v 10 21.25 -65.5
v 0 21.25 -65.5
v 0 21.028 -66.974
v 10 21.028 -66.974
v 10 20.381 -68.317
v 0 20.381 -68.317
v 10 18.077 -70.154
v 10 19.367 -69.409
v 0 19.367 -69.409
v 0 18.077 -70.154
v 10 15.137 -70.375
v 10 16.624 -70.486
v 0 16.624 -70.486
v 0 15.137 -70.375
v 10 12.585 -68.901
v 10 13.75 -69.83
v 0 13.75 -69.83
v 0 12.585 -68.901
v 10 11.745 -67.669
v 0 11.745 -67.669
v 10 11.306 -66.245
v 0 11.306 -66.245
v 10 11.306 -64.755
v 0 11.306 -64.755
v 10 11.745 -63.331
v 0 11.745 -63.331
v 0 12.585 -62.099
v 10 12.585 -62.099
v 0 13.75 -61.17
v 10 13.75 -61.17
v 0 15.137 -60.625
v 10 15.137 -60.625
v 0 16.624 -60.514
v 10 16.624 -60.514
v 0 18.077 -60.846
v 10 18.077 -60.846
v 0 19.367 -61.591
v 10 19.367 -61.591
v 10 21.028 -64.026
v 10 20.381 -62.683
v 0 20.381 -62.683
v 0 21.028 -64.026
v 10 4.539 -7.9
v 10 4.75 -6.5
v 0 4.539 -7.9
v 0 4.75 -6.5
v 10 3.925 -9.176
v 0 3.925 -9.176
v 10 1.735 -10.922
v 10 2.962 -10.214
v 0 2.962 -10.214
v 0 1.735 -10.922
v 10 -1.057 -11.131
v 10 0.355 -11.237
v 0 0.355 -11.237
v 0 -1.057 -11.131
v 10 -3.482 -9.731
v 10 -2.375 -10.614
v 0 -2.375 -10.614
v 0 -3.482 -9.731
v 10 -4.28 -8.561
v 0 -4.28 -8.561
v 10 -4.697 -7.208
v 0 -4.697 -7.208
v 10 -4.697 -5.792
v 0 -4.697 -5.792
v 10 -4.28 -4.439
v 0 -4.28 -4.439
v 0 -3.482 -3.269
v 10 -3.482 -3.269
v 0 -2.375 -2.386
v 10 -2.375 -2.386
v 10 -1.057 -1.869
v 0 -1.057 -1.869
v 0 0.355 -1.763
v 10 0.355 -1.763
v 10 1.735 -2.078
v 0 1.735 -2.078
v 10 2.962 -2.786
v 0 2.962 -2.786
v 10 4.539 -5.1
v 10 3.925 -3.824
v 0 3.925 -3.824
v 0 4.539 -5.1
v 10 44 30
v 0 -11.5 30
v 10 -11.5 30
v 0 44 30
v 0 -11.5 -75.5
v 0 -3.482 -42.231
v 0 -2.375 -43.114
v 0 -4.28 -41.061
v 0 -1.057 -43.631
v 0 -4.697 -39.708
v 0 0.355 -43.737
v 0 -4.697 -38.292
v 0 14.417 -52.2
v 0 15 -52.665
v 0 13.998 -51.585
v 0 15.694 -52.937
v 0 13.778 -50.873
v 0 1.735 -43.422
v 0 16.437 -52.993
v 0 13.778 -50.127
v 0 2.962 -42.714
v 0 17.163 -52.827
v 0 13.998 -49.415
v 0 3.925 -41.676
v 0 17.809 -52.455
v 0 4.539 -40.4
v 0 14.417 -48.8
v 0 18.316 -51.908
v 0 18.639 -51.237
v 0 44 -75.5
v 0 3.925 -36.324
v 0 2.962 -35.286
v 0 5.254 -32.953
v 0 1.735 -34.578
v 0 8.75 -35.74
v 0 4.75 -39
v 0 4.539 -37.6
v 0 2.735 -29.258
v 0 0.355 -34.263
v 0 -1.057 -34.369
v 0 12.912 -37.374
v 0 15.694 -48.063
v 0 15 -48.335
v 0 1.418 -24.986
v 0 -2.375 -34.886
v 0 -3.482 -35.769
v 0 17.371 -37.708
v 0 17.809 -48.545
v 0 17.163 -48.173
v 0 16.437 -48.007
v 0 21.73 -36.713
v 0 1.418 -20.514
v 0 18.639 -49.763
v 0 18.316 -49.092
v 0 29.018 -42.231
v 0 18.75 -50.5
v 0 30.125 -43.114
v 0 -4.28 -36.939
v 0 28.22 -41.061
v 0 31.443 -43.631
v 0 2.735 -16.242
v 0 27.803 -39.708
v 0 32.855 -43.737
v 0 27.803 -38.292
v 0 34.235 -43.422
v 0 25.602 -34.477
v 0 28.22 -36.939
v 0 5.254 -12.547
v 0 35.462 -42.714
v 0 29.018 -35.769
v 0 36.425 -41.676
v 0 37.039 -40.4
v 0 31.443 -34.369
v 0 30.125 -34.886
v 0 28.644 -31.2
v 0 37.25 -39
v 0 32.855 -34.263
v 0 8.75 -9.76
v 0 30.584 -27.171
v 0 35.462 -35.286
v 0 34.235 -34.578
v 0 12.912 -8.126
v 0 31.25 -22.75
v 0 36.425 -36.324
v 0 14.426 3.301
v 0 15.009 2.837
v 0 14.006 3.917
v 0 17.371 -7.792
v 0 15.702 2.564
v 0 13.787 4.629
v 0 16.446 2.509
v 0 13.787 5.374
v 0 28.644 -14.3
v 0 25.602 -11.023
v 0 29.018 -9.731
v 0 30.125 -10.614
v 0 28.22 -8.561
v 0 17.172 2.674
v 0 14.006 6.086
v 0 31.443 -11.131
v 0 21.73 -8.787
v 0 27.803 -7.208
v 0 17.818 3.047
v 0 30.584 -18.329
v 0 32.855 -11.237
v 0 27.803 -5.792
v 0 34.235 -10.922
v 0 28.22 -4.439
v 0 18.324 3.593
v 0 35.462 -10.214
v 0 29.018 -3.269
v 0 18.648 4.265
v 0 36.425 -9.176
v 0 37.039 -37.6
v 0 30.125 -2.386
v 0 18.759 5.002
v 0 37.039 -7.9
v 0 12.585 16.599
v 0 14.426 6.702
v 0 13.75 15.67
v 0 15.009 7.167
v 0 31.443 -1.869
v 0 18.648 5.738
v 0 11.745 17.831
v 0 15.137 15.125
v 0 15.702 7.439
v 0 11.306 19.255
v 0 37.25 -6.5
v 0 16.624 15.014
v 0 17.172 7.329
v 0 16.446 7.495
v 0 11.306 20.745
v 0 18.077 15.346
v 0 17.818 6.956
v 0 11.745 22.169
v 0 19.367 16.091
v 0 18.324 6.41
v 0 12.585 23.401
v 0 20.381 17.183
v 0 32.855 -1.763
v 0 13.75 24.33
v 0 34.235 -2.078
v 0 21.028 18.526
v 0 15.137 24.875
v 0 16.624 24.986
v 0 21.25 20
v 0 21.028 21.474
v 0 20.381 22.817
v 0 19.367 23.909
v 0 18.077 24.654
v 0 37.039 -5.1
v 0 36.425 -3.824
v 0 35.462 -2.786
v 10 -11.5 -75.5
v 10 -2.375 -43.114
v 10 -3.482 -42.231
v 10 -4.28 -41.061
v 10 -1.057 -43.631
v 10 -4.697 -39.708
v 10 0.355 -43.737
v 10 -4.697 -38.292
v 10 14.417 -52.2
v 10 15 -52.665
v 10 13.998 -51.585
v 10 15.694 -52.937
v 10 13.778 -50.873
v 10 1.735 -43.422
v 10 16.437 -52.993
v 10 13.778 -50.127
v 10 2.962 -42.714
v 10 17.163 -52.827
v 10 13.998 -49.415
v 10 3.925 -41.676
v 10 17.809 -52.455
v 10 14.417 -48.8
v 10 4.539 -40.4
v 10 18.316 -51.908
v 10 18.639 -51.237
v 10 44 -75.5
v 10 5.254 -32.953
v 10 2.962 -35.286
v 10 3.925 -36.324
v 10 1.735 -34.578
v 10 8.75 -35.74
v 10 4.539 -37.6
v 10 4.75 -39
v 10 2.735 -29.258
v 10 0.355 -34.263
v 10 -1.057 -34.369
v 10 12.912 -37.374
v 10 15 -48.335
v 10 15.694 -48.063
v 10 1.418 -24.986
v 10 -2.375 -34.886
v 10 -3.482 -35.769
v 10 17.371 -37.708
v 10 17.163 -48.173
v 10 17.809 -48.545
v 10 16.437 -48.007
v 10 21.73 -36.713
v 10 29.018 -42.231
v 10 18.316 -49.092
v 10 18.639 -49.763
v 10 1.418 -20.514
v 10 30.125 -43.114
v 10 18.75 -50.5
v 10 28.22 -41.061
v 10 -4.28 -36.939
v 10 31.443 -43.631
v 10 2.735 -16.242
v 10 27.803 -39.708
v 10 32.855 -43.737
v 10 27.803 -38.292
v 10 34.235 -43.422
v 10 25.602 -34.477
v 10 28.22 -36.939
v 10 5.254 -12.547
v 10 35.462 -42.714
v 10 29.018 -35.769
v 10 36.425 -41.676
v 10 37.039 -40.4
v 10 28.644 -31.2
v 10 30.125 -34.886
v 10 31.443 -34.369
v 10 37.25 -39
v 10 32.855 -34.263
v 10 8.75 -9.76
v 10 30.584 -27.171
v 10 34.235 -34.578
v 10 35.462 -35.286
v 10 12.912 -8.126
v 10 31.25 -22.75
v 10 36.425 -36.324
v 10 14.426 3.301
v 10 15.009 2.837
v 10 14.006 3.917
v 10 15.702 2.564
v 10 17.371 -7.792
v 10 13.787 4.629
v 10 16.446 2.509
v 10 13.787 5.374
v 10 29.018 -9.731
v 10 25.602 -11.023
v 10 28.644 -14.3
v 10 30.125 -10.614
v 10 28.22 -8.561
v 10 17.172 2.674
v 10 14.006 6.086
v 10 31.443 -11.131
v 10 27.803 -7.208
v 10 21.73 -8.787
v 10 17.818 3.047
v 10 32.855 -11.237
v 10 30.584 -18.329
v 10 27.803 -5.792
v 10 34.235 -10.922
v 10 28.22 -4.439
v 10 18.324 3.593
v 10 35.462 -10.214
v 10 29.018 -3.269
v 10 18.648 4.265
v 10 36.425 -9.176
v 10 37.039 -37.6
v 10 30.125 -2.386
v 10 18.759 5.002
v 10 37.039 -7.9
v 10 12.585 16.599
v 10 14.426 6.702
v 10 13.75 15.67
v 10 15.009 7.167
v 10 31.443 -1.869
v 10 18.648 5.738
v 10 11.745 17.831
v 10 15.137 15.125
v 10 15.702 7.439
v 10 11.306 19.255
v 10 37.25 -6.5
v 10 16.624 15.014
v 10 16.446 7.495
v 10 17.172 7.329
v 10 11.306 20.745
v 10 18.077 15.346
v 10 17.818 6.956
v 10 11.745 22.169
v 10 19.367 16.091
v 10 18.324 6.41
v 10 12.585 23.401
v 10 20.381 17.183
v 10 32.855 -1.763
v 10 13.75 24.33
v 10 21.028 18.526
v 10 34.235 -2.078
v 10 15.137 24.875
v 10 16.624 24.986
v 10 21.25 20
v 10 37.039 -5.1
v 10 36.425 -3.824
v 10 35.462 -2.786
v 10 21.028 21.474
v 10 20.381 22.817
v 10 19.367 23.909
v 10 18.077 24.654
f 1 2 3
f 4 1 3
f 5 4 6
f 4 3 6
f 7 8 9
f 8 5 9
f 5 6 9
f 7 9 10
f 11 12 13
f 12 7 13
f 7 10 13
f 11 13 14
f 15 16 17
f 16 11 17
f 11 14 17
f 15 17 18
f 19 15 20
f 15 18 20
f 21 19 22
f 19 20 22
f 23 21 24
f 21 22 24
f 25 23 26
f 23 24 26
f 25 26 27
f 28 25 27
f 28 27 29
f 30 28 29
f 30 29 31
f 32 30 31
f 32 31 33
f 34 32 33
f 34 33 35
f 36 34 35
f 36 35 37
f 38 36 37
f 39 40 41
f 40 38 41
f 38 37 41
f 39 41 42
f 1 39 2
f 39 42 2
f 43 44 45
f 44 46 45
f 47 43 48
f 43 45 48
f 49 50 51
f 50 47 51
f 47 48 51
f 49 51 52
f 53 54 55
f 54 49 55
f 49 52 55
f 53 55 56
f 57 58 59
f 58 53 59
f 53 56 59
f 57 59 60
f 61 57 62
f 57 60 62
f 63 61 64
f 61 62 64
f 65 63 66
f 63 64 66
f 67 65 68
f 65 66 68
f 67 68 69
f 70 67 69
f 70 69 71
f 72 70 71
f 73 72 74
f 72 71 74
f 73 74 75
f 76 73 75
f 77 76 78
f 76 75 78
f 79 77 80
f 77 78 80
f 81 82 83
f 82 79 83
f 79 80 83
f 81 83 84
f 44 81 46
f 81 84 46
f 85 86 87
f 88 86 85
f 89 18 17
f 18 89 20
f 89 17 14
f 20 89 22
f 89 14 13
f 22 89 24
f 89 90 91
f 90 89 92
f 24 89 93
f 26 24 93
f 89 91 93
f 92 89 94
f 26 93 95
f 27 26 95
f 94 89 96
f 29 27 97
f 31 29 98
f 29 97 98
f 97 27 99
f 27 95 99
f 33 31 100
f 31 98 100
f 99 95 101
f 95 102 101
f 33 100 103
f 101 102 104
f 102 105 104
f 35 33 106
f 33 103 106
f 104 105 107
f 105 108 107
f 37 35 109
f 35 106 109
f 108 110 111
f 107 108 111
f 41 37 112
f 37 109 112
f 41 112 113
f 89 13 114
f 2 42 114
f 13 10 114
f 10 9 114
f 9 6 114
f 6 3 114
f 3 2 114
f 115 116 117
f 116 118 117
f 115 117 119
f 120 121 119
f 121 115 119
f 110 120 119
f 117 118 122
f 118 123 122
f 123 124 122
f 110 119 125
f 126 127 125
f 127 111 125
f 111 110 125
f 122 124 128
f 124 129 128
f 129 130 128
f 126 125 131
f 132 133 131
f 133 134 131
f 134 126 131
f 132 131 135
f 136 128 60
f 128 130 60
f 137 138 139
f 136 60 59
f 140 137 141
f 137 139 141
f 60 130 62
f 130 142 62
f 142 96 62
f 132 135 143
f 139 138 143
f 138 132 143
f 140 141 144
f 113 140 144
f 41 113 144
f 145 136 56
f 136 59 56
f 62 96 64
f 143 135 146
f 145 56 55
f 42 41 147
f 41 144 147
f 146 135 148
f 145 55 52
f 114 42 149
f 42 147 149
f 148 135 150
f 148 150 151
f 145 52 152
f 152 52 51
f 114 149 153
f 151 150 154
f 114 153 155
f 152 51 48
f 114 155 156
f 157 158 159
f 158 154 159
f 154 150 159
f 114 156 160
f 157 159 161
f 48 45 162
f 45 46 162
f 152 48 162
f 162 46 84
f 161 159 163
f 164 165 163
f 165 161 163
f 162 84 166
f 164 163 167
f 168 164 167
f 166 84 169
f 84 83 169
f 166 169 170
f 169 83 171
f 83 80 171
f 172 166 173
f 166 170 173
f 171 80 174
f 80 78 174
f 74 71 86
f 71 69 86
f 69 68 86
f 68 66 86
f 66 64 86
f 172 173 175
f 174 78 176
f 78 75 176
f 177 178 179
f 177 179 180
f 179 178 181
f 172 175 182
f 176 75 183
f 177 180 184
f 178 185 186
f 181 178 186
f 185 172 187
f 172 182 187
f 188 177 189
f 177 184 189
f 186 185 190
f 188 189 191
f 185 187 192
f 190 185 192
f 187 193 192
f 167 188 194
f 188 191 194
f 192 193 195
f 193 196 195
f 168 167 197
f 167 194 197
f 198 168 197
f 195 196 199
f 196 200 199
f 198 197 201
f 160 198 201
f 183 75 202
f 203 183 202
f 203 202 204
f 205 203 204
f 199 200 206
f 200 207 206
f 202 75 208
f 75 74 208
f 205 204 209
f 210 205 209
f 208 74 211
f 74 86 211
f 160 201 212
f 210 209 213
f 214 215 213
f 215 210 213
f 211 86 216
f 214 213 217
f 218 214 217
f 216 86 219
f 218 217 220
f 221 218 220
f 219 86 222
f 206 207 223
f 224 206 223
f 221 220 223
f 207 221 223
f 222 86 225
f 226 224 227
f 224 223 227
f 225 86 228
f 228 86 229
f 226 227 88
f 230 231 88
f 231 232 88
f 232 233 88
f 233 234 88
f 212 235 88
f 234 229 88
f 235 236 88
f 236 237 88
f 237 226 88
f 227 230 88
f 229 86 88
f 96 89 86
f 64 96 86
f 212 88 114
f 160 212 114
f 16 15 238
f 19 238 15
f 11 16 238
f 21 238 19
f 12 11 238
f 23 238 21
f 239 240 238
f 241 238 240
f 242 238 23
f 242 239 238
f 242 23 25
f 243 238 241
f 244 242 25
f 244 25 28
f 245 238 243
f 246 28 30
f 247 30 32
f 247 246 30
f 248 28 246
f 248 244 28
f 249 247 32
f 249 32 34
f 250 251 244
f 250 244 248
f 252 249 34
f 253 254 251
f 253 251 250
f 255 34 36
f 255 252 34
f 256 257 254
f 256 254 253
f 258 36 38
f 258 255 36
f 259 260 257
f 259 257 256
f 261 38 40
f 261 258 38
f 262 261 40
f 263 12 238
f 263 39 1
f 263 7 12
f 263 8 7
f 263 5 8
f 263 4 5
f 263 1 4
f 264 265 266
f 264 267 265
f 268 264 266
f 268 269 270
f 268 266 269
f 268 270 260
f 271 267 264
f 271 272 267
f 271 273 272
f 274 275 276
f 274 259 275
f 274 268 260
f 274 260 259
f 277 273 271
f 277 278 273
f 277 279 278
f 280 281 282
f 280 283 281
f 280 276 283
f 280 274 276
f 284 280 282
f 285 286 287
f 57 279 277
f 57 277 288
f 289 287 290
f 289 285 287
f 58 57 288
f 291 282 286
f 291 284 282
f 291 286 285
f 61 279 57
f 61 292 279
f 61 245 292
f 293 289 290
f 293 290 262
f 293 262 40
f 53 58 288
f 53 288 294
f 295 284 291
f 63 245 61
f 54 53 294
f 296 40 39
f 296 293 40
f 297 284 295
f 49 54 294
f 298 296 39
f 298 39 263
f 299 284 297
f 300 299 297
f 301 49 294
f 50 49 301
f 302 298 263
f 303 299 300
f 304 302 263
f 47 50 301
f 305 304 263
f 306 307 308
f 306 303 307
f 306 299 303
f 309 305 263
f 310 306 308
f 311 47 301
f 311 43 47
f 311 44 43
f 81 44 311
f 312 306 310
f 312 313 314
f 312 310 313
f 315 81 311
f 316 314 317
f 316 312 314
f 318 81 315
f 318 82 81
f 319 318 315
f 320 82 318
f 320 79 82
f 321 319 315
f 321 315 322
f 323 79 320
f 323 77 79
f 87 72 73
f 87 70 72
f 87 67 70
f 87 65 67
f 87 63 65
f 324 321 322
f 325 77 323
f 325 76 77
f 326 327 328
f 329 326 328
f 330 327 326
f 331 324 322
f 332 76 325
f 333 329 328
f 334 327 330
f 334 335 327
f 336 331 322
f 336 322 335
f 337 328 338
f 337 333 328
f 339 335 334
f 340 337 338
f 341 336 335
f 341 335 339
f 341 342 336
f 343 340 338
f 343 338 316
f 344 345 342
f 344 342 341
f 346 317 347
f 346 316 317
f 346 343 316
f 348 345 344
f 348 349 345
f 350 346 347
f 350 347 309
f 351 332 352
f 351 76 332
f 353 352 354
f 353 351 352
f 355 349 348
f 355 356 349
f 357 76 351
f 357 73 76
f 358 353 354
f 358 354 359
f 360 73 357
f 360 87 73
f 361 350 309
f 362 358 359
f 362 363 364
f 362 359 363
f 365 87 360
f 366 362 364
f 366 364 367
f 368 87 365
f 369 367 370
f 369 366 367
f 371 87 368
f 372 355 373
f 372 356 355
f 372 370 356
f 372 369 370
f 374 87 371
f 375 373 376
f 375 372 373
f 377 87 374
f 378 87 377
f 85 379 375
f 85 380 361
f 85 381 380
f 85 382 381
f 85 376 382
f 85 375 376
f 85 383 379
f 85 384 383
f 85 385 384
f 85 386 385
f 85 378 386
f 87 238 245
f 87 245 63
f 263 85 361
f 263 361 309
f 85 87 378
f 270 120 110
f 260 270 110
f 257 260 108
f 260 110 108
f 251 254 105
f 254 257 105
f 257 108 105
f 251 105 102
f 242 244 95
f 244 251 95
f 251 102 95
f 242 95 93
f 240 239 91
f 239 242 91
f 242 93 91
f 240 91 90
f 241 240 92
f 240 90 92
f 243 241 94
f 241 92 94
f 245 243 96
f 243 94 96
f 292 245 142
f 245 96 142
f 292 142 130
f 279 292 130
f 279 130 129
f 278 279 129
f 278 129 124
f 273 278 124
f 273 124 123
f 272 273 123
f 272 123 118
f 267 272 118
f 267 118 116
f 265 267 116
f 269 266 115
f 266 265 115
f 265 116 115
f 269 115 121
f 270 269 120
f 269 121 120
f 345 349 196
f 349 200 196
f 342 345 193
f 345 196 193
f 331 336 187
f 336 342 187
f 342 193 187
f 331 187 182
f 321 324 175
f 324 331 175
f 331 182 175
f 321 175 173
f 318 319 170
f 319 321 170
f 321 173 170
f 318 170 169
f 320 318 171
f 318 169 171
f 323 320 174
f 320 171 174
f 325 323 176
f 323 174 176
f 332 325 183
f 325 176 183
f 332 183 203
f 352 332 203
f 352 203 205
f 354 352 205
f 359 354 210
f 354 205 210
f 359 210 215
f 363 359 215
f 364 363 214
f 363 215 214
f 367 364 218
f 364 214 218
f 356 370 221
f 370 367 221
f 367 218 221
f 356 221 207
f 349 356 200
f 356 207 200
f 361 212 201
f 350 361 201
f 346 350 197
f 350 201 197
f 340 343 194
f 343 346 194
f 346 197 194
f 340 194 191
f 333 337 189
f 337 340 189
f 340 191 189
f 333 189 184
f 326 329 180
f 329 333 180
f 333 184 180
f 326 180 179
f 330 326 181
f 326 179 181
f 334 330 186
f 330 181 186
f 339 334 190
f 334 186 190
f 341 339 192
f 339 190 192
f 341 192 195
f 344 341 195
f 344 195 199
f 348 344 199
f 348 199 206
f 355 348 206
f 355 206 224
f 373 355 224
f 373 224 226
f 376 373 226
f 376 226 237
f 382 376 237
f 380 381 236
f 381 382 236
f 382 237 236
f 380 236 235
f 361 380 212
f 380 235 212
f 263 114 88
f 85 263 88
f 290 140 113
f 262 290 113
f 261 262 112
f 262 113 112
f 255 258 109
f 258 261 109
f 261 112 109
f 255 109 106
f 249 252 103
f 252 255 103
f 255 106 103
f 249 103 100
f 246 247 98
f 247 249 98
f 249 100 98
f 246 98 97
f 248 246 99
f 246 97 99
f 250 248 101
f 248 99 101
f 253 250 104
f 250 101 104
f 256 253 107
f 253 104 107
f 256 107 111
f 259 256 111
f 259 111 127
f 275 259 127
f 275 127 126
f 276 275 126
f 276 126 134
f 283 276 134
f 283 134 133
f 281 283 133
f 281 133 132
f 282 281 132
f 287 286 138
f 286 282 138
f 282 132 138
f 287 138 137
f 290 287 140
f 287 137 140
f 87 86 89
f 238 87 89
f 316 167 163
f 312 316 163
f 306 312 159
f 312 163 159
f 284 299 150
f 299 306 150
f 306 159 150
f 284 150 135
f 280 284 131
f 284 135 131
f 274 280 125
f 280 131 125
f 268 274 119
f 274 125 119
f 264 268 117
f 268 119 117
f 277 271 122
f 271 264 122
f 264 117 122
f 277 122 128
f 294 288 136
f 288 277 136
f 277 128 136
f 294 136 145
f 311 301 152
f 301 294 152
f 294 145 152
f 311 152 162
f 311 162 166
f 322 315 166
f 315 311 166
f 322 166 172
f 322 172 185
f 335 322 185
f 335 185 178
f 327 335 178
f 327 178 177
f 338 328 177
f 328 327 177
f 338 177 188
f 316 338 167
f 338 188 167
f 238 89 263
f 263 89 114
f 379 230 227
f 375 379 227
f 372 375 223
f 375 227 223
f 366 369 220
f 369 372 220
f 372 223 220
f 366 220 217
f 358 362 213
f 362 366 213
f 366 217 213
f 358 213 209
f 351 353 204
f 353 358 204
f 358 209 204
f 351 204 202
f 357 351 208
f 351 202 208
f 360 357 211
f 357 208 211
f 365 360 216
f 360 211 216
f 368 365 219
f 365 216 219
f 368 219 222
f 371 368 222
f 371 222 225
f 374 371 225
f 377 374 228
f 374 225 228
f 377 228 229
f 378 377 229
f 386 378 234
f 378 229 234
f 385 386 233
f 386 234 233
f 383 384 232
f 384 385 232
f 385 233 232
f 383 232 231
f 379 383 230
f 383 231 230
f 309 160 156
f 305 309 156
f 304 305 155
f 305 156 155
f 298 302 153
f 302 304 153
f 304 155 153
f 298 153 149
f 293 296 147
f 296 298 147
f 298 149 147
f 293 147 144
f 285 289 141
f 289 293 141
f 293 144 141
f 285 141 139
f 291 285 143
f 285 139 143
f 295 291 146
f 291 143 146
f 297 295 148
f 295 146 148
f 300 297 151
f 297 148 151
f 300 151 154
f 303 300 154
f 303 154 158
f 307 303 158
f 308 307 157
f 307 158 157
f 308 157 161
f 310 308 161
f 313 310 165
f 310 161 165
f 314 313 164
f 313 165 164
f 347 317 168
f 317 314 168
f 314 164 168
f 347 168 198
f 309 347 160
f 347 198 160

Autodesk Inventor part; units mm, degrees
ref_plane "YZ Plane" through (0, 0, 0) normal (1, 0, 0) x (0, 1, 0)
ref_plane "XZ Plane" through (0, 0, 0) normal (0, 1, 0) x (-1, 0, 0)
ref_plane "XY Plane" through (0, 0, 0) normal (0, 0, 1) x (1, 0, 0)
sketch "Sketch1" plane through (0, 0, 0) normal (1, 0, 0) x (0, 1, 0)
  line L0 (-6, -12.5) -> (-6, -12.9)
  arc A0 (-6, -12.9) -> (-5.6, -13.3) centre (-5.6, -12.9) ccw
  line L1 (-5.6, -13.3) -> (-4.9, -13.3)
  arc A1 (-4.9, -13.3) -> (-4.7, -13.1) centre (-4.9, -13.1) ccw
  line L2 (-4.7, -13.1) -> (-4.7, -12.85)
  arc A2 (-4.5, -12.65) -> (-4.7, -12.85) centre (-4.5, -12.85) ccw
  line L3 (-4.5, -12.65) -> (-1.8, -12.65)
  arc A3 (-1.4, -13.05) -> (-1.8, -12.65) centre (-1.8, -13.05) ccw
  line L4 (-1.4, -13.05) -> (-1.4, -18.75)
  line L5 (-1.8, -19.15) -> (-4.5, -19.15)
  arc A4 (-1.8, -19.15) -> (-1.4, -18.75) centre (-1.8, -18.75) ccw
  arc A5 (-4.7, -18.95) -> (-4.5, -19.15) centre (-4.5, -18.95) ccw
  line L6 (-4.7, -18.95) -> (-4.7, -18.7)
  arc A6 (-4.7, -18.7) -> (-4.9, -18.5) centre (-4.9, -18.7) ccw
  line L7 (-4.9, -18.5) -> (-5.6, -18.5)
  arc A7 (-5.6, -18.5) -> (-6, -18.9) centre (-5.6, -18.9) ccw
  line L8 (-6, -18.9) -> (-6, -19.5)
  line L9 (-6.5, -6.5) -> (-6.5, -12.5)
  line L10 (-6.5, -12.5) -> (-2.5, -12.5)
  line L11 (-1.05, -19.5) -> (-6.5, -19.5)
  line L12 (-6.5, -19.5) -> (-6.5, -26)
  line L13 (-6.5, -26) -> (-1.05, -26)
  line L14 (-6, -26) -> (-6, -26.6)
  arc A8 (-6, -26.6) -> (-5.6, -27) centre (-5.6, -26.6) ccw
  line L15 (-5.6, -27) -> (-4.9, -27)
  arc A9 (-4.9, -27) -> (-4.7, -26.8) centre (-4.9, -26.8) ccw
  arc A10 (-4.5, -26.35) -> (-4.7, -26.55) centre (-4.5, -26.55) ccw
  line L16 (-4.7, -26.8) -> (-4.7, -26.55)
  line L17 (-4.5, -26.35) -> (-1.8, -26.35)
  arc A11 (-1.4, -26.75) -> (-1.8, -26.35) centre (-1.8, -26.75) ccw
  line L18 (-1.4, -26.75) -> (-1.4, -32.45)
  arc A12 (-1.8, -32.85) -> (-1.4, -32.45) centre (-1.8, -32.45) ccw
  line L19 (-1.8, -32.85) -> (-4.5, -32.85)
  arc A13 (-4.7, -32.65) -> (-4.5, -32.85) centre (-4.5, -32.65) ccw
  line L20 (-4.7, -32.65) -> (-4.7, -32.4)
  arc A14 (-4.7, -32.4) -> (-4.9, -32.2) centre (-4.9, -32.4) ccw
  line L21 (-4.9, -32.2) -> (-5.6, -32.2)
  arc A15 (-5.6, -32.2) -> (-6, -32.6) centre (-5.6, -32.6) ccw
  line L22 (-6, -32.6) -> (-6, -33)
  line L23 (-2.5, -33) -> (-6.5, -33)
  line L24 (-6.5, -33) -> (-6.5, -39)
  line L25 (32.5, 0) -> (0, 0)
  circle A16 centre (0, -6.5) radius 4.75
  circle A17 centre (32.5, -6.5) radius 4.75
  circle A18 centre (0, -39) radius 4.75
  circle A19 centre (32.5, -39) radius 4.75
  line L26 (39, -26) -> (39, -19.5)
  line L27 (39, -12.5) -> (39, -6.5)
  line L28 (39, -39) -> (39, -33)
  line L29 (26.5, -45.5) -> (32.5, -45.5)
  line L30 (0, -45.5) -> (6, -45.5)
  line L31 (13, -45.5) -> (19.5, -45.5)
  circle A20 centre (16.2588, 5.0016) radius 2.5
  circle A21 centre (16.25, -50.5) radius 2.5
  line L32 (44, 10) -> (-11.5, 10)
  line L33 (-11.5, 10) -> (-11.5, -55.5)
  line L34 (-11.5, -55.5) -> (44, -55.5)
  line L35 (44, -55.5) -> (44, 10)
  line L36 (44, 10) -> (-11.5, 10)
  line L37 (-11.5, 10) -> (-11.5, 30)
  line L38 (-11.5, 30) -> (44, 30)
  line L39 (44, 30) -> (44, 10)
  line L40 (44, -55.5) -> (-11.5, -55.5)
  line L41 (-11.5, -55.5) -> (-11.5, -75.5)
  line L42 (-11.5, -75.5) -> (44, -75.5)
  line L43 (44, -75.5) -> (44, -55.5)
  circle A22 centre (16.25, 20) radius 5
  circle A23 centre (16.25, -65.5) radius 5
  circle A24 centre (16.25, -22.75) radius 15
  circle A25 centre (16.25, -22.75) radius 5
  point P0 (24.75, -17.8425)
  point P1 (-11.5, 10)
  dimension "d0" = 20
  dimension "d1" = 20
  dimension "d2" = 10
  dimension "d3" = 10
extrude "Extrusion2" add sketch "Sketch1" along normal blind 10 contours L35 L34 L33 L32 | L32 L37 L38 L39 | L43 L42 L41 L34
properties part number "PlacaSuperiorHidráulicos_CPY"
